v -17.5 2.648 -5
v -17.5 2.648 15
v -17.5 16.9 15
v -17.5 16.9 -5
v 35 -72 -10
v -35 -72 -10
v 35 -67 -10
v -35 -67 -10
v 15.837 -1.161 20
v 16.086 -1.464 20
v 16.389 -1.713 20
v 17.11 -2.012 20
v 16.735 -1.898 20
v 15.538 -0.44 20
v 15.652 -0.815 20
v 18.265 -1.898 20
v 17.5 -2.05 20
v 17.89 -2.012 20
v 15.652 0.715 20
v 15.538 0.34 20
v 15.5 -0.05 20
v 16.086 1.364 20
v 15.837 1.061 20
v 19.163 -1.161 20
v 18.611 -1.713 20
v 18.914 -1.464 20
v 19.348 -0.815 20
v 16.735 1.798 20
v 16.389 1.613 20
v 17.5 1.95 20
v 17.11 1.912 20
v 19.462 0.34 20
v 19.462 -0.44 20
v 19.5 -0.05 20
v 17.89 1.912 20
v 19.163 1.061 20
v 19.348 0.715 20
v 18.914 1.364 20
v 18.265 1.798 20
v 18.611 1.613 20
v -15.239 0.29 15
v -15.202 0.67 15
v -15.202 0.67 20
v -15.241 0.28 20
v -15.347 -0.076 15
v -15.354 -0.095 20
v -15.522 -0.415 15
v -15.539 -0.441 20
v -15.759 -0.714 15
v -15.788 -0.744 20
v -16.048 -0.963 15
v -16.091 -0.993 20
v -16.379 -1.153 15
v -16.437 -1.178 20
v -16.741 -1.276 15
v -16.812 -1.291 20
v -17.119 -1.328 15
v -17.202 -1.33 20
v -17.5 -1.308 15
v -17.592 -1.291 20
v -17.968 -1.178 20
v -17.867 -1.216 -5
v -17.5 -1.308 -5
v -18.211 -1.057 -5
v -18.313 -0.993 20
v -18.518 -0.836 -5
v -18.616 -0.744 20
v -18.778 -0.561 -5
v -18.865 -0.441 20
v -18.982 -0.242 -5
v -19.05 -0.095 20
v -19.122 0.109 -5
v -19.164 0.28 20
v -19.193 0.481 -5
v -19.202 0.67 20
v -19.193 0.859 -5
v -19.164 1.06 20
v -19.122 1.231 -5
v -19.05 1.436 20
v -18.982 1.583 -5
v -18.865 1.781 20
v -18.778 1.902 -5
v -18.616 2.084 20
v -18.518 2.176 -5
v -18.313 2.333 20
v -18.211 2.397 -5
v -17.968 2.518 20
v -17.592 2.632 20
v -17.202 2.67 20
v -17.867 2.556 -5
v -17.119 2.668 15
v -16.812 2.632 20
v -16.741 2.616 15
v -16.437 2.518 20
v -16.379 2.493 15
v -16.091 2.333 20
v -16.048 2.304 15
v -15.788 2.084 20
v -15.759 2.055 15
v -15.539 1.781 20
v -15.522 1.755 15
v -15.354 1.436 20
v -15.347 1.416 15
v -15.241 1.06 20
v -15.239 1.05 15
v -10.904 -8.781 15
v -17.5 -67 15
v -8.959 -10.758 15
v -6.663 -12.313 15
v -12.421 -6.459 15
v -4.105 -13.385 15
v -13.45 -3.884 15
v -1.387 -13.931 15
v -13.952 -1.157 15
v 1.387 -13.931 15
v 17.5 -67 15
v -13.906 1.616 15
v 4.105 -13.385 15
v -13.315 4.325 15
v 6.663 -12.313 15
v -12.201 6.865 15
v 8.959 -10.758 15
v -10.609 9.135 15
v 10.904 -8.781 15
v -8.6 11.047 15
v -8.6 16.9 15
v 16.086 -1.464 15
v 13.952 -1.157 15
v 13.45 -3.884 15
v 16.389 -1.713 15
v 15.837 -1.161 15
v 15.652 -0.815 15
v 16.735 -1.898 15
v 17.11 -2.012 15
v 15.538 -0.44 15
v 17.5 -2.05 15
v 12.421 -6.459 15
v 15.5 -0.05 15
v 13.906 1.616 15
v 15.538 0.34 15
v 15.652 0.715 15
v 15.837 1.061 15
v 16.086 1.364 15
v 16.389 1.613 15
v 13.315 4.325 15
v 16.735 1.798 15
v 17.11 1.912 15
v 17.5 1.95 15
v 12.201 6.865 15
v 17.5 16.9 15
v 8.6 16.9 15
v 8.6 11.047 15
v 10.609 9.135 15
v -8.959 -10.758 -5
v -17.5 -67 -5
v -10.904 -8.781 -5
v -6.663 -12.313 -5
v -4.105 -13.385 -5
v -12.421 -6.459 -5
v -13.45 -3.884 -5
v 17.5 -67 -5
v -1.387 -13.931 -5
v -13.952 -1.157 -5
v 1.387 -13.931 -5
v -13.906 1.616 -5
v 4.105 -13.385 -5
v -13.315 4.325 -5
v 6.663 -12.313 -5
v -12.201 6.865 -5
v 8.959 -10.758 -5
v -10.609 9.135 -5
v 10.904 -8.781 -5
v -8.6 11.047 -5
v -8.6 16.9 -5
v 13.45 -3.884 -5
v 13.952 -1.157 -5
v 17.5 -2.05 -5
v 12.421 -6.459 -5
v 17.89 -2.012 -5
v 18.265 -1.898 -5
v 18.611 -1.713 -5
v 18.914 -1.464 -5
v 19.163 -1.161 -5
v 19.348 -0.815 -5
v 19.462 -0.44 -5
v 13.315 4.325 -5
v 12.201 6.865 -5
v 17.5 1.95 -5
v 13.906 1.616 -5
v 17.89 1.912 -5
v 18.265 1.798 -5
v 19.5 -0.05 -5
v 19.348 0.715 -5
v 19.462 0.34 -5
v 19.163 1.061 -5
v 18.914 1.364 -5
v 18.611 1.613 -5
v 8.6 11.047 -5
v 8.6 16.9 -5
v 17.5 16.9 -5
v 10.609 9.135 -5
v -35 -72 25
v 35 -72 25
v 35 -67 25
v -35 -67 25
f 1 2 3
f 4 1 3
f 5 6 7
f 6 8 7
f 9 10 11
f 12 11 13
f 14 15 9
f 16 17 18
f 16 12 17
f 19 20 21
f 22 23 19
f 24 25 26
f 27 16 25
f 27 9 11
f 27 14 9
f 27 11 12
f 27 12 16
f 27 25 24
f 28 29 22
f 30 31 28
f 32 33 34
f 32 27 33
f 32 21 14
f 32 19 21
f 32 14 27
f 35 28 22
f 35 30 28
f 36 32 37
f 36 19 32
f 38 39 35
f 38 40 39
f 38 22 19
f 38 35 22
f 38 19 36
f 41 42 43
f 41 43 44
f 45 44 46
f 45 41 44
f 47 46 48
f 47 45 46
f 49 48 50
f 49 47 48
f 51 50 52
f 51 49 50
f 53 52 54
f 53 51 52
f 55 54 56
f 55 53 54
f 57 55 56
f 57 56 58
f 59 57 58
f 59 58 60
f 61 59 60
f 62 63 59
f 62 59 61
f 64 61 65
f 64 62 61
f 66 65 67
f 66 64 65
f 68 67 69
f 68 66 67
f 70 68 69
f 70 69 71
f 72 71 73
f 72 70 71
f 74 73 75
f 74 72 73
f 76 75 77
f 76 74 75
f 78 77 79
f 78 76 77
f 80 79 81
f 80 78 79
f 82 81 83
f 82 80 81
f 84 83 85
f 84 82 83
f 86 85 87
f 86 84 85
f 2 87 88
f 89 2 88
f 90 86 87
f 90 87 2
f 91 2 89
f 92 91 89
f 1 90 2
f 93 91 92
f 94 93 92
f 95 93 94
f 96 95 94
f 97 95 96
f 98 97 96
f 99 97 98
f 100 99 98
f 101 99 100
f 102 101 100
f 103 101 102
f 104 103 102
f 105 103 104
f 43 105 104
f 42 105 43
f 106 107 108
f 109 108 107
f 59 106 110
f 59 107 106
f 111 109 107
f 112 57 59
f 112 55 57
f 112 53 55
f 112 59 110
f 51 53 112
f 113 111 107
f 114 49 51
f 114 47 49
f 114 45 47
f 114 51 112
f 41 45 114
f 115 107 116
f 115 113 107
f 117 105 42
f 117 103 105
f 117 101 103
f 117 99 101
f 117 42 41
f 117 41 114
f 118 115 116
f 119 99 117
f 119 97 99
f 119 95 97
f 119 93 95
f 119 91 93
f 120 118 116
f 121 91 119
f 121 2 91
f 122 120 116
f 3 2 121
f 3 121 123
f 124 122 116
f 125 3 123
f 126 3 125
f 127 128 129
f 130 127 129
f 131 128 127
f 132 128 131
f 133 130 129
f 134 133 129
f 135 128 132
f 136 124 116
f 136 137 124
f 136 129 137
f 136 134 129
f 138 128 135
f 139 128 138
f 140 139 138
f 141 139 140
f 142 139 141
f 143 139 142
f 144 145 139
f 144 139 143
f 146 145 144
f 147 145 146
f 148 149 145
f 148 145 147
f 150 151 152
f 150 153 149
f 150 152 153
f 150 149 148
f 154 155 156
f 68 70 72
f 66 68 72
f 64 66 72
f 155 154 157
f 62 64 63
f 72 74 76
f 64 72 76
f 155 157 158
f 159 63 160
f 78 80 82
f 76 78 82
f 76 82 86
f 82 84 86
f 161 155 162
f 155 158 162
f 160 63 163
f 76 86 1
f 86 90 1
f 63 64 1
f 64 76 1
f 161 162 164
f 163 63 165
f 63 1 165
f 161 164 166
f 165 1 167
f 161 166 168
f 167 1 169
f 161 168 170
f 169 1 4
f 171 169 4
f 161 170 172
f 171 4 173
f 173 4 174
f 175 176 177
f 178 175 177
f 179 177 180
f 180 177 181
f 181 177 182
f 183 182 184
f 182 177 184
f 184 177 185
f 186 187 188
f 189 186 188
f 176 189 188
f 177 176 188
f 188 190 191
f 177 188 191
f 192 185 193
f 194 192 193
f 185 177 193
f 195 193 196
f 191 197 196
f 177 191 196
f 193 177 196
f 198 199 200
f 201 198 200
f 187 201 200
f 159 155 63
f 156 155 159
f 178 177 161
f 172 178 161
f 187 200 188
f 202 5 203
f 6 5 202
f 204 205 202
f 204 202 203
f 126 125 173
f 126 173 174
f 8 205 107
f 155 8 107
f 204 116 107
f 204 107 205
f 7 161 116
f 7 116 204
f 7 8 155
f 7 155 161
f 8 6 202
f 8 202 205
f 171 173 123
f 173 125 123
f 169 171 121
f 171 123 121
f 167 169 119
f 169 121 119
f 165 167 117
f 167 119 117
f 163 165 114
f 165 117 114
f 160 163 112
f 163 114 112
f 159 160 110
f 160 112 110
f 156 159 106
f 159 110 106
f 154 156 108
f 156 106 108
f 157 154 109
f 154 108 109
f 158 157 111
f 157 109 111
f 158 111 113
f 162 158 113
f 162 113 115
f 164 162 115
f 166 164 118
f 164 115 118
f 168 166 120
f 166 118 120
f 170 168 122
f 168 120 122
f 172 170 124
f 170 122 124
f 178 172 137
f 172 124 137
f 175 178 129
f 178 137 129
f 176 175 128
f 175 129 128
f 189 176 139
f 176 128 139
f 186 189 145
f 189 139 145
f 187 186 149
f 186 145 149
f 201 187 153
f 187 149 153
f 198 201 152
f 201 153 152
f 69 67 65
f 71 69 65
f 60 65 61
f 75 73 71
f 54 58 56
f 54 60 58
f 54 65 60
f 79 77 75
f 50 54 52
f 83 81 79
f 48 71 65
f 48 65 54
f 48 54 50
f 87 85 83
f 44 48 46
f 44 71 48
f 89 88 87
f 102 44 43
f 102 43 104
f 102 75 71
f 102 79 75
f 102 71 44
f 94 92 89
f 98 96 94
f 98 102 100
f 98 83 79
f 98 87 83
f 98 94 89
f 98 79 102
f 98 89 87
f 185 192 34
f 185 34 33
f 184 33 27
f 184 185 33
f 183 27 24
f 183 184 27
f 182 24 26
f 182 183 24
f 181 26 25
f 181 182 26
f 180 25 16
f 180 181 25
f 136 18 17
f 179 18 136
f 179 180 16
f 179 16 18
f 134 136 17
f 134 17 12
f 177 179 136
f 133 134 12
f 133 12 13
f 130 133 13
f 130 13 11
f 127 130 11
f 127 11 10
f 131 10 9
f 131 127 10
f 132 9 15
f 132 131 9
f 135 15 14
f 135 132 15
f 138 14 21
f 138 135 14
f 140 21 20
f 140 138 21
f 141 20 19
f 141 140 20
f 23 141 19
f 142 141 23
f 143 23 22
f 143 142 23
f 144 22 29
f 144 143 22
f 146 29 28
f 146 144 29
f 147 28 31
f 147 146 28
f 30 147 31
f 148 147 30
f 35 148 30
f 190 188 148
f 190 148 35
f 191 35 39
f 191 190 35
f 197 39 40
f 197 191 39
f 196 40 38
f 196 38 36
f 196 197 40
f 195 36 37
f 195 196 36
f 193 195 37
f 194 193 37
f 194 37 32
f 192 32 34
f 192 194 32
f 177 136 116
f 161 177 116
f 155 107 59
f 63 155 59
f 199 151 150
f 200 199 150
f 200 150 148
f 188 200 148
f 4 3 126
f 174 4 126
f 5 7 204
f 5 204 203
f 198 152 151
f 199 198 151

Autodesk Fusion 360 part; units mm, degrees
sketch "草图1" plane through (0, 0, 0) normal (0, 0, 1) x (1, 0, 0)
  line L0 (-8.6, 11.0472) -> (-8.6, 16.9)
  line L1 (8.6, 11.0472) -> (8.6, 16.9)
  arc A0 (-8.6, 11.0472) -> (8.6, 11.0472) centre (0, 0) ccw
  line L2 (-17.5, 16.9) -> (-8.6, 16.9)
  line L3 (8.6, 16.9) -> (17.5, 16.9)
  line L4 (0, -14) -> (0, 27.4039)
  circle A1 centre (-17.2022, 0.6702) radius 2
  circle A2 centre (17.5, -0.05) radius 2
  line L5 (17.5, 16.9) -> (17.5, 1.95)
  line L6 (17.5, -2.05) -> (17.5, -17)
  line L7 (-17.5, -17) -> (-17.5, -1.3076)
  line L8 (-17.5, 2.6479) -> (-17.5, 16.9)
  line L9 (17.5, -17) -> (17.5, -67)
  line L10 (17.5, -67) -> (-17.5, -67)
  line L11 (-17.5, -67) -> (-17.5, -17)
  line L12 (35, -72) -> (-35, -72)
  line L13 (-35, -72) -> (-35, -67)
  line L14 (35, -67) -> (35, -72)
  line L15 (-35, -67) -> (35, -67)
  dimension "d1" = 28
  dimension "d6" = 17.2
  dimension "d9" = 4
  dimension "d10" = 4
  dimension "d15" = 50
extrude "拉伸3" add sketch "草图1" along normal blind 15 contours L0 L1 A0 L2 L3 A1 A2 L5 L6 L7 L8 L9 L10 L11 L15
extrude "拉伸4" add sketch "草图1" along normal blind 20 contours A1 | A2
extrude "拉伸5" add sketch "草图1" against normal blind 5 contours L0 L1 A0 L2 L3 A1 A2 L5 L6 L7 L8 L9 L10 L11 L15
extrude "拉伸6" add sketch "草图1" against normal blind 5 contours A1 | A2
extrude "拉伸7" add sketch "草图1" along normal blind 20 contours L10 L12 L13 L14 L15
extrude "拉伸8" add sketch "草图1" against normal blind 10 contours L10 L12 L13 L14 L15
extrude "拉伸9" add 1 faces at (-11.6667, -68.6667, 20) along direction (0, 0, 1) blind 5
